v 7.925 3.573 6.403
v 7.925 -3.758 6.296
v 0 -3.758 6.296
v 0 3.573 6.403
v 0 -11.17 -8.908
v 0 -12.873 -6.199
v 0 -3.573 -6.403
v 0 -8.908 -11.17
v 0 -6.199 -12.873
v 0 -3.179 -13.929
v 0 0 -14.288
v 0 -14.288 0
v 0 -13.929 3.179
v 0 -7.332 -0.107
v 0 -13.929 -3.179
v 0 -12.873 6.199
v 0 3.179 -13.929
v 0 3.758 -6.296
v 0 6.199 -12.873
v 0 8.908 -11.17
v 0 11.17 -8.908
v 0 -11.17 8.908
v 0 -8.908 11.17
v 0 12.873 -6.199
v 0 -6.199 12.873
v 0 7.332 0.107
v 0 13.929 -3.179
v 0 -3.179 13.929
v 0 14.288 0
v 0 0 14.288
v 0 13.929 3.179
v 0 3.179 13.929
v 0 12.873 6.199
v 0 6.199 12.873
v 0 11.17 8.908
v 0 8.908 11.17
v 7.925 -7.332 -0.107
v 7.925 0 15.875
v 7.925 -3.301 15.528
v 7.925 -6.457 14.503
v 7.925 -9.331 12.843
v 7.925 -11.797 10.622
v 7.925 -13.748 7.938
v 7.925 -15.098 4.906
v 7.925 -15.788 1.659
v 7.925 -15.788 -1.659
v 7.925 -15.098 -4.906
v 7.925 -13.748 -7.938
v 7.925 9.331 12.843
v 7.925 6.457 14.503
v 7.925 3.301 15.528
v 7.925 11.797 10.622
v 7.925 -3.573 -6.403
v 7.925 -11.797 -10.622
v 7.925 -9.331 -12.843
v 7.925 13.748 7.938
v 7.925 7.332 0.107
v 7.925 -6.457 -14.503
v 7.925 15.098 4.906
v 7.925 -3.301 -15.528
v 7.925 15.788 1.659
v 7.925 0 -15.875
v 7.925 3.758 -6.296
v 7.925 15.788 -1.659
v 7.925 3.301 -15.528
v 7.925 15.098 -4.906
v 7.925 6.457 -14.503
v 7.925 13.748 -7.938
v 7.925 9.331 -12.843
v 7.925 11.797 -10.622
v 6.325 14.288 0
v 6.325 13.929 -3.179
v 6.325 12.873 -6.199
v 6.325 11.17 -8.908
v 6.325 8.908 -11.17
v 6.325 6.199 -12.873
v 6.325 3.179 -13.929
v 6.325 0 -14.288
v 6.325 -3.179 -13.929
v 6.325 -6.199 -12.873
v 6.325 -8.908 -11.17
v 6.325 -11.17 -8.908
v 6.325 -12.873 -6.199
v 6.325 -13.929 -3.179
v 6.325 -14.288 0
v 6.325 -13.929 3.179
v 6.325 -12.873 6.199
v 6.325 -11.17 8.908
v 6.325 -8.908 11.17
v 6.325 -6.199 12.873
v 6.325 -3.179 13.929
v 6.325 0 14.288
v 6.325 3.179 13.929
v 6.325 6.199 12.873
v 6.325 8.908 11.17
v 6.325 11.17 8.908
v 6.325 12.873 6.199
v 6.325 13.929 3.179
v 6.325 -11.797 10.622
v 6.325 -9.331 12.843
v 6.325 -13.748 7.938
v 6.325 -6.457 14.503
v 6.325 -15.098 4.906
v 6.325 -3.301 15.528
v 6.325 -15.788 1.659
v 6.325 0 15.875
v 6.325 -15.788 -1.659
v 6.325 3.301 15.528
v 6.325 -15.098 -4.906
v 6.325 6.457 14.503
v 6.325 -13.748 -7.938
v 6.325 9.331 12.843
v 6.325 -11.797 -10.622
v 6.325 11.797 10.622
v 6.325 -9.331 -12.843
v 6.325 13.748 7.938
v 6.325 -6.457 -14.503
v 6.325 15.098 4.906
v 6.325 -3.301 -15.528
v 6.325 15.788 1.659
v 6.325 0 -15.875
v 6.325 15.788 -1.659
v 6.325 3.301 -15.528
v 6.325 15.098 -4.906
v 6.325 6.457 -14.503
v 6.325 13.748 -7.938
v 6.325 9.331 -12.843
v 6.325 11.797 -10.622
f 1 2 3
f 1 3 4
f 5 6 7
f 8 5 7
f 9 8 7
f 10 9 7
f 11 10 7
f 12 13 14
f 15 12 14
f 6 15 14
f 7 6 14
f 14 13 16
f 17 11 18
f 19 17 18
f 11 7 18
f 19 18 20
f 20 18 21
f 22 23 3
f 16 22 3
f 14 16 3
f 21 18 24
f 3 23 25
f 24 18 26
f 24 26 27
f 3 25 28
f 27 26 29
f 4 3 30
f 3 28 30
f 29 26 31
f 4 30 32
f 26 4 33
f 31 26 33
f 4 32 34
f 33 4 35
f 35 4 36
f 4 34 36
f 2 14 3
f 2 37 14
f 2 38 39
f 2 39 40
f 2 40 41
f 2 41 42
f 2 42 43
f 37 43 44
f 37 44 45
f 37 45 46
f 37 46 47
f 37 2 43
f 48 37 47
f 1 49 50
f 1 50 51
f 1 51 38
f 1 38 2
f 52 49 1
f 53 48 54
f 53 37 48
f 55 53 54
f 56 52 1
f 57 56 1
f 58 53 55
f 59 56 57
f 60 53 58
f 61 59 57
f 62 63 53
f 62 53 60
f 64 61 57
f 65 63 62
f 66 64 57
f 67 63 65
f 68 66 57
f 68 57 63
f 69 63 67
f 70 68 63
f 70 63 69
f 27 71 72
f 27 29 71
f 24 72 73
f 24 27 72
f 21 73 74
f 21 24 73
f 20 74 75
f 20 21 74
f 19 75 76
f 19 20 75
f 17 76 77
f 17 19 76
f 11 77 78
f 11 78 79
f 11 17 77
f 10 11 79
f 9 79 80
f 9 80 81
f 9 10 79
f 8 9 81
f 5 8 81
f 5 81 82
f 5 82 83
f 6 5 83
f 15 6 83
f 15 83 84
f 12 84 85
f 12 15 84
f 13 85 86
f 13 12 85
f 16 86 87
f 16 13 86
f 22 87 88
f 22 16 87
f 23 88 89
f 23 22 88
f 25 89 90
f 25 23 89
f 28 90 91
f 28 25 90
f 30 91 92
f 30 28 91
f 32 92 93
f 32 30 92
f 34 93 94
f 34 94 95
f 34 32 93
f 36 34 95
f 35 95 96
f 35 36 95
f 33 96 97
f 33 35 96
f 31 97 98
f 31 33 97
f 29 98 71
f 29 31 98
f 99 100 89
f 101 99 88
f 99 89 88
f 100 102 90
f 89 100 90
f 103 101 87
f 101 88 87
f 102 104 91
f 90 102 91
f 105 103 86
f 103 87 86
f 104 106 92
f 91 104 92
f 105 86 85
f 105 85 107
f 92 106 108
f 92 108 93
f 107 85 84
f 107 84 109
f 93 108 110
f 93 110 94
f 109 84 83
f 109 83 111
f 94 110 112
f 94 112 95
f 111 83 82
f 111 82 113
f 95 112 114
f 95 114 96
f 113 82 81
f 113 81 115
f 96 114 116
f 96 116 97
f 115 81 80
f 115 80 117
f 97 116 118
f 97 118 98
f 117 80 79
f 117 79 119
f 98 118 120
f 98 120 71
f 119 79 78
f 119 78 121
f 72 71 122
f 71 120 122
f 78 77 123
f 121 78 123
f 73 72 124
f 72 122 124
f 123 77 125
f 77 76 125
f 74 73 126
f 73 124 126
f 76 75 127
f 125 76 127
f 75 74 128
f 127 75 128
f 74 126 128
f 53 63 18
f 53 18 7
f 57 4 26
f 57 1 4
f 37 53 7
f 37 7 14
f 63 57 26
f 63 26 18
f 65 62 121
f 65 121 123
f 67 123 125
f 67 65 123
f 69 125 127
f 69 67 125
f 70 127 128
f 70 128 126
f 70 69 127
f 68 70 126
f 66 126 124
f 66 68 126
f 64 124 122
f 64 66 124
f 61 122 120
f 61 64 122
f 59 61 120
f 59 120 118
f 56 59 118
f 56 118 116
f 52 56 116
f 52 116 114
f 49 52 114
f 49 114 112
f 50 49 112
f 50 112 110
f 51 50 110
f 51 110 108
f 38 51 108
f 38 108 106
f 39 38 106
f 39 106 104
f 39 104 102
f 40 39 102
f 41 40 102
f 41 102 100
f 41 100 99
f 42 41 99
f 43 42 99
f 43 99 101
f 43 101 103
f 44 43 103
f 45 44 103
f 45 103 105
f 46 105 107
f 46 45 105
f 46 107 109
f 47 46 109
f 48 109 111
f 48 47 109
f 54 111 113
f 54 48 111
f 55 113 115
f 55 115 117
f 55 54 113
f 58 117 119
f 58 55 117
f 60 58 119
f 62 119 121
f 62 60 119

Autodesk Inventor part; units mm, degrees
ref_plane "YZ Plane" through (0, 0, 0) normal (1, 0, 0) x (0, 1, 0)
ref_plane "XZ Plane" through (0, 0, 0) normal (0, 1, 0) x (-1, 0, 0)
ref_plane "XY Plane" through (0, 0, 0) normal (0, 0, 1) x (1, 0, 0)
sketch "Sketch1" plane through (0, 0, 0) normal (1, 0, 0) x (0, 1, 0)
  circle A0 centre (0, 0) radius 14.2875
  dimension "d0" = 28.575
extrude "Extrusion1" add sketch "Sketch1" along normal blind 7.9248
sketch "Sketch4" plane through (7.9248, 0, 0) normal (1, 0, 0) x (0, 0, -1)
  line L0 (6.2959, 3.7584) -> (6.4028, -3.5732)
  line L1 (6.4028, -3.5732) -> (0.1069, -7.3316)
  line L2 (0.1069, -7.3316) -> (-6.2959, -3.7584)
  line L3 (-6.2959, -3.7584) -> (-6.4028, 3.5732)
  line L4 (-6.4028, 3.5732) -> (-0.1069, 7.3316)
  line L5 (-0.1069, 7.3316) -> (6.2959, 3.7584)
  point P0 (0, 0)
  point P1 (0, 0)
  dimension "d16" = 12.7
extrude "Extrusion2" cut sketch "Sketch4" against normal blind 279.4
sketch "Sketch5" plane through (7.9248, 0, 0) normal (1, 0, 0) x (0, 0, -1)
  circle A0 centre (0, 0) radius 15.875
  dimension "d7" = 31.75
extrude "Extrusion3" add sketch "Sketch5" against normal blind 1.6002
extrude "Extrusion4" cut sketch "Sketch4" against normal blind 1.6002
extrude "Extrusion5" add sketch "Sketch4" against normal blind 2.54
extrude "Extrusion6" cut sketch "Sketch4" against normal blind 2.54
properties part number "hexagon bearing"
